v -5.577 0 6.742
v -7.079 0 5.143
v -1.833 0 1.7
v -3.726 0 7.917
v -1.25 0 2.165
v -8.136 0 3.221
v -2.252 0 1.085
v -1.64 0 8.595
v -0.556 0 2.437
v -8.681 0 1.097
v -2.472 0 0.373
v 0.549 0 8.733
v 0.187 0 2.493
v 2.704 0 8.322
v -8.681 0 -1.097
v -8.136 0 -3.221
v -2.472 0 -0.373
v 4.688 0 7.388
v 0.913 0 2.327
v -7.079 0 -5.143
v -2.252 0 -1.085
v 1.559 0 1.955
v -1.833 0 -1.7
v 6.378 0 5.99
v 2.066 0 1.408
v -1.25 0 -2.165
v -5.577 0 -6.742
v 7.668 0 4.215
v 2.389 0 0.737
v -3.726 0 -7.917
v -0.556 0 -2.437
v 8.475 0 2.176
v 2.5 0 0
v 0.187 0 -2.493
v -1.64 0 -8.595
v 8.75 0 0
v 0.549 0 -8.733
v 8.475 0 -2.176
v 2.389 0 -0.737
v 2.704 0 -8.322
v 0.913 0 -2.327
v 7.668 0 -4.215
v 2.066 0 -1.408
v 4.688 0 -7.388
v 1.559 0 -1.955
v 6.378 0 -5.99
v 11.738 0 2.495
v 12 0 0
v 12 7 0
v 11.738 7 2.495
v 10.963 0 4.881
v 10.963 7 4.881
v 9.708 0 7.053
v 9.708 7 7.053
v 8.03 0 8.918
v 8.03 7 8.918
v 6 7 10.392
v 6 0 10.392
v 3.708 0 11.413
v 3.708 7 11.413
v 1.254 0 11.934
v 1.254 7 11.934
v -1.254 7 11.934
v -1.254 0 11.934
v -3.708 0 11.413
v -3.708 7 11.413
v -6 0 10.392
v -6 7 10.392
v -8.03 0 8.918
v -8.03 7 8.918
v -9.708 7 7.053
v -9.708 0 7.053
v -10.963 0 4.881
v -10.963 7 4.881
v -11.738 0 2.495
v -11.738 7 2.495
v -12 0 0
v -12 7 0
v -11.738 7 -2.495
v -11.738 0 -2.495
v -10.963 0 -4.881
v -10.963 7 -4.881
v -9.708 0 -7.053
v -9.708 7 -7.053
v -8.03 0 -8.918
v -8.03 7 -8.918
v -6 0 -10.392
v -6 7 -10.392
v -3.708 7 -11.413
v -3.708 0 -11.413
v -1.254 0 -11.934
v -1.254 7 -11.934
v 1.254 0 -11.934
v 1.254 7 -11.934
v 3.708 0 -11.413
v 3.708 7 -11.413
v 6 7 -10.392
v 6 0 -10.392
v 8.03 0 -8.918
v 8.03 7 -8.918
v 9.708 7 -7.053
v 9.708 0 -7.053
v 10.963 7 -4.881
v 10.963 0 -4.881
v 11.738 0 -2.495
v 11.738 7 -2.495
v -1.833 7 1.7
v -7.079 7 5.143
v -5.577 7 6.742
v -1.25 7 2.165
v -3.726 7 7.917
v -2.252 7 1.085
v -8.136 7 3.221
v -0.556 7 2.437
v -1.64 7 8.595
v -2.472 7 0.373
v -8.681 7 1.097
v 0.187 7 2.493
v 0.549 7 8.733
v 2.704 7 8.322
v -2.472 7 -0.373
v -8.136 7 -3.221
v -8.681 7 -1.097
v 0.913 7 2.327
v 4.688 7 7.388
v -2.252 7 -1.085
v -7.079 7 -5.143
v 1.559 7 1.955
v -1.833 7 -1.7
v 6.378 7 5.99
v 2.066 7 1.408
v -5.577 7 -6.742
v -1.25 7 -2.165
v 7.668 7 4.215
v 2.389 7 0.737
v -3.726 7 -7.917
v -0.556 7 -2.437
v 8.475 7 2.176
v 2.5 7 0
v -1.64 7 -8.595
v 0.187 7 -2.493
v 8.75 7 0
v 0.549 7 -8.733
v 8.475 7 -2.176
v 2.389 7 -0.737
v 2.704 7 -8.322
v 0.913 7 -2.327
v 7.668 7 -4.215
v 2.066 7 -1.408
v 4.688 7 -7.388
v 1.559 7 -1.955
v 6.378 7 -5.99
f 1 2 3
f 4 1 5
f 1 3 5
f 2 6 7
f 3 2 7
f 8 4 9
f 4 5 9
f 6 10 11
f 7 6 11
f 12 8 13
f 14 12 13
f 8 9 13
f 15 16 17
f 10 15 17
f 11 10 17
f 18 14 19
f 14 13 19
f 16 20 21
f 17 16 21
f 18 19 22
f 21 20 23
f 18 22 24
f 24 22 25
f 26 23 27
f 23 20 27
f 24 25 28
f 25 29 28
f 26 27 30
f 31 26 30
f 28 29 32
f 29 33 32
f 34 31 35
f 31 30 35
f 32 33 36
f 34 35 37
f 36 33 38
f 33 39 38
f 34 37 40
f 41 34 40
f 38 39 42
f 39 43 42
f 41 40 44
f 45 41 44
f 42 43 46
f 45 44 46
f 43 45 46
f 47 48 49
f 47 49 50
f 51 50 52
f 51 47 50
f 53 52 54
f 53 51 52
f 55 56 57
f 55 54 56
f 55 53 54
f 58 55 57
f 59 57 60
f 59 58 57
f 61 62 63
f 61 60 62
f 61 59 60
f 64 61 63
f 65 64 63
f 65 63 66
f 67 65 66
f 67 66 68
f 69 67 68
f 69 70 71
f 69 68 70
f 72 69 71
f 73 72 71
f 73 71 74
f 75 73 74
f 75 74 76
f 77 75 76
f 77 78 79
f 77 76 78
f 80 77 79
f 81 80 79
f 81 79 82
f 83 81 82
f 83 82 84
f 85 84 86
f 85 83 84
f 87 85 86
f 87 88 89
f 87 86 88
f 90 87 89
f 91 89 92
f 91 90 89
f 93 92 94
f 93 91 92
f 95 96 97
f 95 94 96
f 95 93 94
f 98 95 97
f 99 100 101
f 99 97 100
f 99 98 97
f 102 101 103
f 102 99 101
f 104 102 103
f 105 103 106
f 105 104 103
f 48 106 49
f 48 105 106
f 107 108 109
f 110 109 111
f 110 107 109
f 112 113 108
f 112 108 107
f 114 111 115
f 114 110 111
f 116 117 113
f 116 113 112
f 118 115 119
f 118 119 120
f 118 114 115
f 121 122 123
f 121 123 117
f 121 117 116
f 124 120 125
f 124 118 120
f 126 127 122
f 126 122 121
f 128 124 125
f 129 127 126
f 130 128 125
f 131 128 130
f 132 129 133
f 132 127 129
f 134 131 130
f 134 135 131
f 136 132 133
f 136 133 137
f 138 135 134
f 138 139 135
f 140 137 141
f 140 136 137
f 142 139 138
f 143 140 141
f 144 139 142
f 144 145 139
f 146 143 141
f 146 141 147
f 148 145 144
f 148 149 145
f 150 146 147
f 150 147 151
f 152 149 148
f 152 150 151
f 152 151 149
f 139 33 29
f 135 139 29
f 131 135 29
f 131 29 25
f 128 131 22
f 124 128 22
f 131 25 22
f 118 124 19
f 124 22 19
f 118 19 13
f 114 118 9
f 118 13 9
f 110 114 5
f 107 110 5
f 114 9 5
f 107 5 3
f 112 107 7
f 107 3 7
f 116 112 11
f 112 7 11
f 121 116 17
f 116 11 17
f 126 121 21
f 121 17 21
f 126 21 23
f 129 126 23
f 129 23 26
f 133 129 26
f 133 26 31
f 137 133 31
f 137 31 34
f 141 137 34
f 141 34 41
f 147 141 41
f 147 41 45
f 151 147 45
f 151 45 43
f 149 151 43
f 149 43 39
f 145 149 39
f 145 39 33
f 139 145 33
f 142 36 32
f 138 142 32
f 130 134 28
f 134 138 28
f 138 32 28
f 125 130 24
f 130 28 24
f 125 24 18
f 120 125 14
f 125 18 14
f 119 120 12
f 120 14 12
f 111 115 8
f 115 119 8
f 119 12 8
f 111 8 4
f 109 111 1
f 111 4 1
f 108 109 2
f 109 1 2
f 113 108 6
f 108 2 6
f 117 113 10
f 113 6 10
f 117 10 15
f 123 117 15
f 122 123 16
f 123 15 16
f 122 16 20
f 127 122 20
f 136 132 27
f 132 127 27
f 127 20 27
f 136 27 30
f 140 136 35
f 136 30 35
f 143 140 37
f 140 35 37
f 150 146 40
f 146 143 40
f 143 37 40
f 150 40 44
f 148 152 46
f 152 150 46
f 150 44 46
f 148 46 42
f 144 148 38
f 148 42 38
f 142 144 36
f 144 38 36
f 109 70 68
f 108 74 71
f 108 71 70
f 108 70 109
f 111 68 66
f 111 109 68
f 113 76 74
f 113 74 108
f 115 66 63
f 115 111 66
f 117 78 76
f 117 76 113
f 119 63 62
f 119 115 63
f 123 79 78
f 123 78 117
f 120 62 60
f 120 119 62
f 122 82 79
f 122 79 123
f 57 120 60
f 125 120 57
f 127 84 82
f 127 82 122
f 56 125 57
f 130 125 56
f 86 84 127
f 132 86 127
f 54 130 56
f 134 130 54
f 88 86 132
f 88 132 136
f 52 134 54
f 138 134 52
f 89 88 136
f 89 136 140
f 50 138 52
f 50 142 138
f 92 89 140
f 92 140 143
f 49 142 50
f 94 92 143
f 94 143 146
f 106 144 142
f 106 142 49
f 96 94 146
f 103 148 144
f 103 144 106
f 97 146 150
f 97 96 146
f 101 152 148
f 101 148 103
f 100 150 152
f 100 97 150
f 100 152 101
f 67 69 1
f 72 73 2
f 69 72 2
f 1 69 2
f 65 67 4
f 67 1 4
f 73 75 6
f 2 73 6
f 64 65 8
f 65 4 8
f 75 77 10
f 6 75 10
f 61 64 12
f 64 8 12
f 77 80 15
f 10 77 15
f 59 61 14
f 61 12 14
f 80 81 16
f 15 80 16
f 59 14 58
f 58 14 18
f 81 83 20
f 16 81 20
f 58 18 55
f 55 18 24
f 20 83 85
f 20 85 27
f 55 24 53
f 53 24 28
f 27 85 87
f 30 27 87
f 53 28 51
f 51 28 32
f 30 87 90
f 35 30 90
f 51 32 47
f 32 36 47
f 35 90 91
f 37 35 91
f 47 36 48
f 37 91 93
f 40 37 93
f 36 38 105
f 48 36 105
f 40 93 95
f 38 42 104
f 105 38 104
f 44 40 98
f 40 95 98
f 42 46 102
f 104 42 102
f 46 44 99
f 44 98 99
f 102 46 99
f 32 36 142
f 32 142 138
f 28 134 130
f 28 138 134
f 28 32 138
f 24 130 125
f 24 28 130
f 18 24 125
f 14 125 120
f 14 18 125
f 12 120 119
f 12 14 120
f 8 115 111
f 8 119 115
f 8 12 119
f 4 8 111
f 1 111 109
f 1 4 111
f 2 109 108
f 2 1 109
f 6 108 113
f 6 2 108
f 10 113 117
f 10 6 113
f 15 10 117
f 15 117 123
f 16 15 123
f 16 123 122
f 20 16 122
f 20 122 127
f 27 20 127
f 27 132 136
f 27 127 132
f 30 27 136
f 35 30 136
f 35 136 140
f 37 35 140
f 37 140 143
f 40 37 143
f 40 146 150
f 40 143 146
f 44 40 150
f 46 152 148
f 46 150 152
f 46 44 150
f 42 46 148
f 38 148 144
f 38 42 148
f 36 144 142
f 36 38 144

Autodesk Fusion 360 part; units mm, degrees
sketch "Sketch1" plane through (0, 0, 0) normal (0, 1, 0) x (1, 0, 0)
  circle A0 centre (0, 0) radius 8.75
  dimension "d1" = 17.5
extrude "Extrude1" add sketch "Sketch1" along normal blind 7 makes body 1
sketch "Sketch2" plane through (0, 0, 0) normal (0, 1, 0) x (1, 0, 0)
  circle A0 centre (0, 0) radius 12
  circle A1 centre (0, 0) radius 8.75
  dimension "d4" = 24
  dimension "d5" = 17.5
extrude "Extrude2" add sketch "Sketch2" along normal blind 7 separate body makes body 2
sketch "Sketch3" plane through (0, 0, 0) normal (0, -1, 0) x (1, 0, 0)
  circle A0 centre (0, 0) radius 8.75
  circle A1 centre (0, 0) radius 2.5
  dimension "d8" = 5
extrude "Extrude3" cut sketch "Sketch3" against normal blind 39 contours A1 bodies 1
